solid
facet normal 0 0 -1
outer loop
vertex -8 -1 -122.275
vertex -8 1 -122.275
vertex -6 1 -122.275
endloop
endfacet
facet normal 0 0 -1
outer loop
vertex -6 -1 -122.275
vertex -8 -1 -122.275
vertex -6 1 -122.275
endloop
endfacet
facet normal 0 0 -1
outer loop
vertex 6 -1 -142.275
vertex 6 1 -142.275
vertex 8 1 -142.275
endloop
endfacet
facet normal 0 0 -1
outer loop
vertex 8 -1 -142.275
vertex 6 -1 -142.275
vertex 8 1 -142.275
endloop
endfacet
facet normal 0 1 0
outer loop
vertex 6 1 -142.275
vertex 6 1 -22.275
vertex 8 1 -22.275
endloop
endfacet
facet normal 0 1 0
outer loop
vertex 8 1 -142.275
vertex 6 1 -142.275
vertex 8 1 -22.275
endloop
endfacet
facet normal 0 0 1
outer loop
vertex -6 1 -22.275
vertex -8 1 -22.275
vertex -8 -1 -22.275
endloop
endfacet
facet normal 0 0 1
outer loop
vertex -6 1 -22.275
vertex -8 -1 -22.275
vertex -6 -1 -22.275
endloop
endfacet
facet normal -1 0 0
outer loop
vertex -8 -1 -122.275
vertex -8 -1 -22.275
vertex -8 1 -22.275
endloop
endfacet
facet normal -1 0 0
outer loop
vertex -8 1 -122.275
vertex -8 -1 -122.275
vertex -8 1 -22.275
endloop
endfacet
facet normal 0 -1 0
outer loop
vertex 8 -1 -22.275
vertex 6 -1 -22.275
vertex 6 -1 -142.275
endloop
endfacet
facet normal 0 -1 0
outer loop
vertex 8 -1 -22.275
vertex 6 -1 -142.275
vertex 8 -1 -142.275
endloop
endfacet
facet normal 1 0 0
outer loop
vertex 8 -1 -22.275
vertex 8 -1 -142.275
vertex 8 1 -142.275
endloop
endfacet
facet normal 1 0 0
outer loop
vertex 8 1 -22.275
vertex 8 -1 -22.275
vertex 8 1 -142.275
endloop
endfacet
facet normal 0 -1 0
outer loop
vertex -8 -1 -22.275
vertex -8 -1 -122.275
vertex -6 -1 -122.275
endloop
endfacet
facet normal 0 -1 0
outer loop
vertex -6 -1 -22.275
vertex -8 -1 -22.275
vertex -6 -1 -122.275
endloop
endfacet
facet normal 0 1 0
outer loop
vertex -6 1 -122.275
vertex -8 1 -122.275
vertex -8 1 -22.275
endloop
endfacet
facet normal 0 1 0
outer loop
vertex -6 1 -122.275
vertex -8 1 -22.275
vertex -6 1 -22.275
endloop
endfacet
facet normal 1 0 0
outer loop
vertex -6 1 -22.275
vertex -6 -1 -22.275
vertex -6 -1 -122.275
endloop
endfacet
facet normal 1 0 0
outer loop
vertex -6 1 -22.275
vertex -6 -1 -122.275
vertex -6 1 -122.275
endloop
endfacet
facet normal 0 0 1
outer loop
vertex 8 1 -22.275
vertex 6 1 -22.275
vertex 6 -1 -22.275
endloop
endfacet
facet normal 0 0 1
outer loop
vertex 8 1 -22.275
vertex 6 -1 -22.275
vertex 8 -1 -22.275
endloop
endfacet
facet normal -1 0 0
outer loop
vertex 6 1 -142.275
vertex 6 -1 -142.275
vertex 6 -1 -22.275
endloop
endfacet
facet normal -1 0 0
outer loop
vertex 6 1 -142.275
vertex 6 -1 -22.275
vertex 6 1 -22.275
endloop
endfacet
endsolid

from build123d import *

# Parameters (mm, degrees)
F3_W     = 2
F3_H     = 2
F4_DEPTH = 120
F5_DEPTH = 100


# Not quite as in the source:
# - the program builds the solid bodies; features that only make, move or delete a surface that nothing else refers to are left out


with BuildPart() as f4:
    # F3 (on face) → F4 (new body)
    with BuildSketch(Plane.XY.offset(-22.2749225795)):
        with Locations((7, 0)):
            Rectangle(F3_W, F3_H)
    extrude(amount=-F4_DEPTH)


with BuildPart() as f5:
    # F3 (on face) → F5 (new body)
    with BuildSketch(Plane.XY.offset(-22.2749225795)):
        with Locations((-7, 0)):
            Rectangle(F3_W, F3_H)
    extrude(amount=-F5_DEPTH)


solid = Compound([f4.part, f5.part])
